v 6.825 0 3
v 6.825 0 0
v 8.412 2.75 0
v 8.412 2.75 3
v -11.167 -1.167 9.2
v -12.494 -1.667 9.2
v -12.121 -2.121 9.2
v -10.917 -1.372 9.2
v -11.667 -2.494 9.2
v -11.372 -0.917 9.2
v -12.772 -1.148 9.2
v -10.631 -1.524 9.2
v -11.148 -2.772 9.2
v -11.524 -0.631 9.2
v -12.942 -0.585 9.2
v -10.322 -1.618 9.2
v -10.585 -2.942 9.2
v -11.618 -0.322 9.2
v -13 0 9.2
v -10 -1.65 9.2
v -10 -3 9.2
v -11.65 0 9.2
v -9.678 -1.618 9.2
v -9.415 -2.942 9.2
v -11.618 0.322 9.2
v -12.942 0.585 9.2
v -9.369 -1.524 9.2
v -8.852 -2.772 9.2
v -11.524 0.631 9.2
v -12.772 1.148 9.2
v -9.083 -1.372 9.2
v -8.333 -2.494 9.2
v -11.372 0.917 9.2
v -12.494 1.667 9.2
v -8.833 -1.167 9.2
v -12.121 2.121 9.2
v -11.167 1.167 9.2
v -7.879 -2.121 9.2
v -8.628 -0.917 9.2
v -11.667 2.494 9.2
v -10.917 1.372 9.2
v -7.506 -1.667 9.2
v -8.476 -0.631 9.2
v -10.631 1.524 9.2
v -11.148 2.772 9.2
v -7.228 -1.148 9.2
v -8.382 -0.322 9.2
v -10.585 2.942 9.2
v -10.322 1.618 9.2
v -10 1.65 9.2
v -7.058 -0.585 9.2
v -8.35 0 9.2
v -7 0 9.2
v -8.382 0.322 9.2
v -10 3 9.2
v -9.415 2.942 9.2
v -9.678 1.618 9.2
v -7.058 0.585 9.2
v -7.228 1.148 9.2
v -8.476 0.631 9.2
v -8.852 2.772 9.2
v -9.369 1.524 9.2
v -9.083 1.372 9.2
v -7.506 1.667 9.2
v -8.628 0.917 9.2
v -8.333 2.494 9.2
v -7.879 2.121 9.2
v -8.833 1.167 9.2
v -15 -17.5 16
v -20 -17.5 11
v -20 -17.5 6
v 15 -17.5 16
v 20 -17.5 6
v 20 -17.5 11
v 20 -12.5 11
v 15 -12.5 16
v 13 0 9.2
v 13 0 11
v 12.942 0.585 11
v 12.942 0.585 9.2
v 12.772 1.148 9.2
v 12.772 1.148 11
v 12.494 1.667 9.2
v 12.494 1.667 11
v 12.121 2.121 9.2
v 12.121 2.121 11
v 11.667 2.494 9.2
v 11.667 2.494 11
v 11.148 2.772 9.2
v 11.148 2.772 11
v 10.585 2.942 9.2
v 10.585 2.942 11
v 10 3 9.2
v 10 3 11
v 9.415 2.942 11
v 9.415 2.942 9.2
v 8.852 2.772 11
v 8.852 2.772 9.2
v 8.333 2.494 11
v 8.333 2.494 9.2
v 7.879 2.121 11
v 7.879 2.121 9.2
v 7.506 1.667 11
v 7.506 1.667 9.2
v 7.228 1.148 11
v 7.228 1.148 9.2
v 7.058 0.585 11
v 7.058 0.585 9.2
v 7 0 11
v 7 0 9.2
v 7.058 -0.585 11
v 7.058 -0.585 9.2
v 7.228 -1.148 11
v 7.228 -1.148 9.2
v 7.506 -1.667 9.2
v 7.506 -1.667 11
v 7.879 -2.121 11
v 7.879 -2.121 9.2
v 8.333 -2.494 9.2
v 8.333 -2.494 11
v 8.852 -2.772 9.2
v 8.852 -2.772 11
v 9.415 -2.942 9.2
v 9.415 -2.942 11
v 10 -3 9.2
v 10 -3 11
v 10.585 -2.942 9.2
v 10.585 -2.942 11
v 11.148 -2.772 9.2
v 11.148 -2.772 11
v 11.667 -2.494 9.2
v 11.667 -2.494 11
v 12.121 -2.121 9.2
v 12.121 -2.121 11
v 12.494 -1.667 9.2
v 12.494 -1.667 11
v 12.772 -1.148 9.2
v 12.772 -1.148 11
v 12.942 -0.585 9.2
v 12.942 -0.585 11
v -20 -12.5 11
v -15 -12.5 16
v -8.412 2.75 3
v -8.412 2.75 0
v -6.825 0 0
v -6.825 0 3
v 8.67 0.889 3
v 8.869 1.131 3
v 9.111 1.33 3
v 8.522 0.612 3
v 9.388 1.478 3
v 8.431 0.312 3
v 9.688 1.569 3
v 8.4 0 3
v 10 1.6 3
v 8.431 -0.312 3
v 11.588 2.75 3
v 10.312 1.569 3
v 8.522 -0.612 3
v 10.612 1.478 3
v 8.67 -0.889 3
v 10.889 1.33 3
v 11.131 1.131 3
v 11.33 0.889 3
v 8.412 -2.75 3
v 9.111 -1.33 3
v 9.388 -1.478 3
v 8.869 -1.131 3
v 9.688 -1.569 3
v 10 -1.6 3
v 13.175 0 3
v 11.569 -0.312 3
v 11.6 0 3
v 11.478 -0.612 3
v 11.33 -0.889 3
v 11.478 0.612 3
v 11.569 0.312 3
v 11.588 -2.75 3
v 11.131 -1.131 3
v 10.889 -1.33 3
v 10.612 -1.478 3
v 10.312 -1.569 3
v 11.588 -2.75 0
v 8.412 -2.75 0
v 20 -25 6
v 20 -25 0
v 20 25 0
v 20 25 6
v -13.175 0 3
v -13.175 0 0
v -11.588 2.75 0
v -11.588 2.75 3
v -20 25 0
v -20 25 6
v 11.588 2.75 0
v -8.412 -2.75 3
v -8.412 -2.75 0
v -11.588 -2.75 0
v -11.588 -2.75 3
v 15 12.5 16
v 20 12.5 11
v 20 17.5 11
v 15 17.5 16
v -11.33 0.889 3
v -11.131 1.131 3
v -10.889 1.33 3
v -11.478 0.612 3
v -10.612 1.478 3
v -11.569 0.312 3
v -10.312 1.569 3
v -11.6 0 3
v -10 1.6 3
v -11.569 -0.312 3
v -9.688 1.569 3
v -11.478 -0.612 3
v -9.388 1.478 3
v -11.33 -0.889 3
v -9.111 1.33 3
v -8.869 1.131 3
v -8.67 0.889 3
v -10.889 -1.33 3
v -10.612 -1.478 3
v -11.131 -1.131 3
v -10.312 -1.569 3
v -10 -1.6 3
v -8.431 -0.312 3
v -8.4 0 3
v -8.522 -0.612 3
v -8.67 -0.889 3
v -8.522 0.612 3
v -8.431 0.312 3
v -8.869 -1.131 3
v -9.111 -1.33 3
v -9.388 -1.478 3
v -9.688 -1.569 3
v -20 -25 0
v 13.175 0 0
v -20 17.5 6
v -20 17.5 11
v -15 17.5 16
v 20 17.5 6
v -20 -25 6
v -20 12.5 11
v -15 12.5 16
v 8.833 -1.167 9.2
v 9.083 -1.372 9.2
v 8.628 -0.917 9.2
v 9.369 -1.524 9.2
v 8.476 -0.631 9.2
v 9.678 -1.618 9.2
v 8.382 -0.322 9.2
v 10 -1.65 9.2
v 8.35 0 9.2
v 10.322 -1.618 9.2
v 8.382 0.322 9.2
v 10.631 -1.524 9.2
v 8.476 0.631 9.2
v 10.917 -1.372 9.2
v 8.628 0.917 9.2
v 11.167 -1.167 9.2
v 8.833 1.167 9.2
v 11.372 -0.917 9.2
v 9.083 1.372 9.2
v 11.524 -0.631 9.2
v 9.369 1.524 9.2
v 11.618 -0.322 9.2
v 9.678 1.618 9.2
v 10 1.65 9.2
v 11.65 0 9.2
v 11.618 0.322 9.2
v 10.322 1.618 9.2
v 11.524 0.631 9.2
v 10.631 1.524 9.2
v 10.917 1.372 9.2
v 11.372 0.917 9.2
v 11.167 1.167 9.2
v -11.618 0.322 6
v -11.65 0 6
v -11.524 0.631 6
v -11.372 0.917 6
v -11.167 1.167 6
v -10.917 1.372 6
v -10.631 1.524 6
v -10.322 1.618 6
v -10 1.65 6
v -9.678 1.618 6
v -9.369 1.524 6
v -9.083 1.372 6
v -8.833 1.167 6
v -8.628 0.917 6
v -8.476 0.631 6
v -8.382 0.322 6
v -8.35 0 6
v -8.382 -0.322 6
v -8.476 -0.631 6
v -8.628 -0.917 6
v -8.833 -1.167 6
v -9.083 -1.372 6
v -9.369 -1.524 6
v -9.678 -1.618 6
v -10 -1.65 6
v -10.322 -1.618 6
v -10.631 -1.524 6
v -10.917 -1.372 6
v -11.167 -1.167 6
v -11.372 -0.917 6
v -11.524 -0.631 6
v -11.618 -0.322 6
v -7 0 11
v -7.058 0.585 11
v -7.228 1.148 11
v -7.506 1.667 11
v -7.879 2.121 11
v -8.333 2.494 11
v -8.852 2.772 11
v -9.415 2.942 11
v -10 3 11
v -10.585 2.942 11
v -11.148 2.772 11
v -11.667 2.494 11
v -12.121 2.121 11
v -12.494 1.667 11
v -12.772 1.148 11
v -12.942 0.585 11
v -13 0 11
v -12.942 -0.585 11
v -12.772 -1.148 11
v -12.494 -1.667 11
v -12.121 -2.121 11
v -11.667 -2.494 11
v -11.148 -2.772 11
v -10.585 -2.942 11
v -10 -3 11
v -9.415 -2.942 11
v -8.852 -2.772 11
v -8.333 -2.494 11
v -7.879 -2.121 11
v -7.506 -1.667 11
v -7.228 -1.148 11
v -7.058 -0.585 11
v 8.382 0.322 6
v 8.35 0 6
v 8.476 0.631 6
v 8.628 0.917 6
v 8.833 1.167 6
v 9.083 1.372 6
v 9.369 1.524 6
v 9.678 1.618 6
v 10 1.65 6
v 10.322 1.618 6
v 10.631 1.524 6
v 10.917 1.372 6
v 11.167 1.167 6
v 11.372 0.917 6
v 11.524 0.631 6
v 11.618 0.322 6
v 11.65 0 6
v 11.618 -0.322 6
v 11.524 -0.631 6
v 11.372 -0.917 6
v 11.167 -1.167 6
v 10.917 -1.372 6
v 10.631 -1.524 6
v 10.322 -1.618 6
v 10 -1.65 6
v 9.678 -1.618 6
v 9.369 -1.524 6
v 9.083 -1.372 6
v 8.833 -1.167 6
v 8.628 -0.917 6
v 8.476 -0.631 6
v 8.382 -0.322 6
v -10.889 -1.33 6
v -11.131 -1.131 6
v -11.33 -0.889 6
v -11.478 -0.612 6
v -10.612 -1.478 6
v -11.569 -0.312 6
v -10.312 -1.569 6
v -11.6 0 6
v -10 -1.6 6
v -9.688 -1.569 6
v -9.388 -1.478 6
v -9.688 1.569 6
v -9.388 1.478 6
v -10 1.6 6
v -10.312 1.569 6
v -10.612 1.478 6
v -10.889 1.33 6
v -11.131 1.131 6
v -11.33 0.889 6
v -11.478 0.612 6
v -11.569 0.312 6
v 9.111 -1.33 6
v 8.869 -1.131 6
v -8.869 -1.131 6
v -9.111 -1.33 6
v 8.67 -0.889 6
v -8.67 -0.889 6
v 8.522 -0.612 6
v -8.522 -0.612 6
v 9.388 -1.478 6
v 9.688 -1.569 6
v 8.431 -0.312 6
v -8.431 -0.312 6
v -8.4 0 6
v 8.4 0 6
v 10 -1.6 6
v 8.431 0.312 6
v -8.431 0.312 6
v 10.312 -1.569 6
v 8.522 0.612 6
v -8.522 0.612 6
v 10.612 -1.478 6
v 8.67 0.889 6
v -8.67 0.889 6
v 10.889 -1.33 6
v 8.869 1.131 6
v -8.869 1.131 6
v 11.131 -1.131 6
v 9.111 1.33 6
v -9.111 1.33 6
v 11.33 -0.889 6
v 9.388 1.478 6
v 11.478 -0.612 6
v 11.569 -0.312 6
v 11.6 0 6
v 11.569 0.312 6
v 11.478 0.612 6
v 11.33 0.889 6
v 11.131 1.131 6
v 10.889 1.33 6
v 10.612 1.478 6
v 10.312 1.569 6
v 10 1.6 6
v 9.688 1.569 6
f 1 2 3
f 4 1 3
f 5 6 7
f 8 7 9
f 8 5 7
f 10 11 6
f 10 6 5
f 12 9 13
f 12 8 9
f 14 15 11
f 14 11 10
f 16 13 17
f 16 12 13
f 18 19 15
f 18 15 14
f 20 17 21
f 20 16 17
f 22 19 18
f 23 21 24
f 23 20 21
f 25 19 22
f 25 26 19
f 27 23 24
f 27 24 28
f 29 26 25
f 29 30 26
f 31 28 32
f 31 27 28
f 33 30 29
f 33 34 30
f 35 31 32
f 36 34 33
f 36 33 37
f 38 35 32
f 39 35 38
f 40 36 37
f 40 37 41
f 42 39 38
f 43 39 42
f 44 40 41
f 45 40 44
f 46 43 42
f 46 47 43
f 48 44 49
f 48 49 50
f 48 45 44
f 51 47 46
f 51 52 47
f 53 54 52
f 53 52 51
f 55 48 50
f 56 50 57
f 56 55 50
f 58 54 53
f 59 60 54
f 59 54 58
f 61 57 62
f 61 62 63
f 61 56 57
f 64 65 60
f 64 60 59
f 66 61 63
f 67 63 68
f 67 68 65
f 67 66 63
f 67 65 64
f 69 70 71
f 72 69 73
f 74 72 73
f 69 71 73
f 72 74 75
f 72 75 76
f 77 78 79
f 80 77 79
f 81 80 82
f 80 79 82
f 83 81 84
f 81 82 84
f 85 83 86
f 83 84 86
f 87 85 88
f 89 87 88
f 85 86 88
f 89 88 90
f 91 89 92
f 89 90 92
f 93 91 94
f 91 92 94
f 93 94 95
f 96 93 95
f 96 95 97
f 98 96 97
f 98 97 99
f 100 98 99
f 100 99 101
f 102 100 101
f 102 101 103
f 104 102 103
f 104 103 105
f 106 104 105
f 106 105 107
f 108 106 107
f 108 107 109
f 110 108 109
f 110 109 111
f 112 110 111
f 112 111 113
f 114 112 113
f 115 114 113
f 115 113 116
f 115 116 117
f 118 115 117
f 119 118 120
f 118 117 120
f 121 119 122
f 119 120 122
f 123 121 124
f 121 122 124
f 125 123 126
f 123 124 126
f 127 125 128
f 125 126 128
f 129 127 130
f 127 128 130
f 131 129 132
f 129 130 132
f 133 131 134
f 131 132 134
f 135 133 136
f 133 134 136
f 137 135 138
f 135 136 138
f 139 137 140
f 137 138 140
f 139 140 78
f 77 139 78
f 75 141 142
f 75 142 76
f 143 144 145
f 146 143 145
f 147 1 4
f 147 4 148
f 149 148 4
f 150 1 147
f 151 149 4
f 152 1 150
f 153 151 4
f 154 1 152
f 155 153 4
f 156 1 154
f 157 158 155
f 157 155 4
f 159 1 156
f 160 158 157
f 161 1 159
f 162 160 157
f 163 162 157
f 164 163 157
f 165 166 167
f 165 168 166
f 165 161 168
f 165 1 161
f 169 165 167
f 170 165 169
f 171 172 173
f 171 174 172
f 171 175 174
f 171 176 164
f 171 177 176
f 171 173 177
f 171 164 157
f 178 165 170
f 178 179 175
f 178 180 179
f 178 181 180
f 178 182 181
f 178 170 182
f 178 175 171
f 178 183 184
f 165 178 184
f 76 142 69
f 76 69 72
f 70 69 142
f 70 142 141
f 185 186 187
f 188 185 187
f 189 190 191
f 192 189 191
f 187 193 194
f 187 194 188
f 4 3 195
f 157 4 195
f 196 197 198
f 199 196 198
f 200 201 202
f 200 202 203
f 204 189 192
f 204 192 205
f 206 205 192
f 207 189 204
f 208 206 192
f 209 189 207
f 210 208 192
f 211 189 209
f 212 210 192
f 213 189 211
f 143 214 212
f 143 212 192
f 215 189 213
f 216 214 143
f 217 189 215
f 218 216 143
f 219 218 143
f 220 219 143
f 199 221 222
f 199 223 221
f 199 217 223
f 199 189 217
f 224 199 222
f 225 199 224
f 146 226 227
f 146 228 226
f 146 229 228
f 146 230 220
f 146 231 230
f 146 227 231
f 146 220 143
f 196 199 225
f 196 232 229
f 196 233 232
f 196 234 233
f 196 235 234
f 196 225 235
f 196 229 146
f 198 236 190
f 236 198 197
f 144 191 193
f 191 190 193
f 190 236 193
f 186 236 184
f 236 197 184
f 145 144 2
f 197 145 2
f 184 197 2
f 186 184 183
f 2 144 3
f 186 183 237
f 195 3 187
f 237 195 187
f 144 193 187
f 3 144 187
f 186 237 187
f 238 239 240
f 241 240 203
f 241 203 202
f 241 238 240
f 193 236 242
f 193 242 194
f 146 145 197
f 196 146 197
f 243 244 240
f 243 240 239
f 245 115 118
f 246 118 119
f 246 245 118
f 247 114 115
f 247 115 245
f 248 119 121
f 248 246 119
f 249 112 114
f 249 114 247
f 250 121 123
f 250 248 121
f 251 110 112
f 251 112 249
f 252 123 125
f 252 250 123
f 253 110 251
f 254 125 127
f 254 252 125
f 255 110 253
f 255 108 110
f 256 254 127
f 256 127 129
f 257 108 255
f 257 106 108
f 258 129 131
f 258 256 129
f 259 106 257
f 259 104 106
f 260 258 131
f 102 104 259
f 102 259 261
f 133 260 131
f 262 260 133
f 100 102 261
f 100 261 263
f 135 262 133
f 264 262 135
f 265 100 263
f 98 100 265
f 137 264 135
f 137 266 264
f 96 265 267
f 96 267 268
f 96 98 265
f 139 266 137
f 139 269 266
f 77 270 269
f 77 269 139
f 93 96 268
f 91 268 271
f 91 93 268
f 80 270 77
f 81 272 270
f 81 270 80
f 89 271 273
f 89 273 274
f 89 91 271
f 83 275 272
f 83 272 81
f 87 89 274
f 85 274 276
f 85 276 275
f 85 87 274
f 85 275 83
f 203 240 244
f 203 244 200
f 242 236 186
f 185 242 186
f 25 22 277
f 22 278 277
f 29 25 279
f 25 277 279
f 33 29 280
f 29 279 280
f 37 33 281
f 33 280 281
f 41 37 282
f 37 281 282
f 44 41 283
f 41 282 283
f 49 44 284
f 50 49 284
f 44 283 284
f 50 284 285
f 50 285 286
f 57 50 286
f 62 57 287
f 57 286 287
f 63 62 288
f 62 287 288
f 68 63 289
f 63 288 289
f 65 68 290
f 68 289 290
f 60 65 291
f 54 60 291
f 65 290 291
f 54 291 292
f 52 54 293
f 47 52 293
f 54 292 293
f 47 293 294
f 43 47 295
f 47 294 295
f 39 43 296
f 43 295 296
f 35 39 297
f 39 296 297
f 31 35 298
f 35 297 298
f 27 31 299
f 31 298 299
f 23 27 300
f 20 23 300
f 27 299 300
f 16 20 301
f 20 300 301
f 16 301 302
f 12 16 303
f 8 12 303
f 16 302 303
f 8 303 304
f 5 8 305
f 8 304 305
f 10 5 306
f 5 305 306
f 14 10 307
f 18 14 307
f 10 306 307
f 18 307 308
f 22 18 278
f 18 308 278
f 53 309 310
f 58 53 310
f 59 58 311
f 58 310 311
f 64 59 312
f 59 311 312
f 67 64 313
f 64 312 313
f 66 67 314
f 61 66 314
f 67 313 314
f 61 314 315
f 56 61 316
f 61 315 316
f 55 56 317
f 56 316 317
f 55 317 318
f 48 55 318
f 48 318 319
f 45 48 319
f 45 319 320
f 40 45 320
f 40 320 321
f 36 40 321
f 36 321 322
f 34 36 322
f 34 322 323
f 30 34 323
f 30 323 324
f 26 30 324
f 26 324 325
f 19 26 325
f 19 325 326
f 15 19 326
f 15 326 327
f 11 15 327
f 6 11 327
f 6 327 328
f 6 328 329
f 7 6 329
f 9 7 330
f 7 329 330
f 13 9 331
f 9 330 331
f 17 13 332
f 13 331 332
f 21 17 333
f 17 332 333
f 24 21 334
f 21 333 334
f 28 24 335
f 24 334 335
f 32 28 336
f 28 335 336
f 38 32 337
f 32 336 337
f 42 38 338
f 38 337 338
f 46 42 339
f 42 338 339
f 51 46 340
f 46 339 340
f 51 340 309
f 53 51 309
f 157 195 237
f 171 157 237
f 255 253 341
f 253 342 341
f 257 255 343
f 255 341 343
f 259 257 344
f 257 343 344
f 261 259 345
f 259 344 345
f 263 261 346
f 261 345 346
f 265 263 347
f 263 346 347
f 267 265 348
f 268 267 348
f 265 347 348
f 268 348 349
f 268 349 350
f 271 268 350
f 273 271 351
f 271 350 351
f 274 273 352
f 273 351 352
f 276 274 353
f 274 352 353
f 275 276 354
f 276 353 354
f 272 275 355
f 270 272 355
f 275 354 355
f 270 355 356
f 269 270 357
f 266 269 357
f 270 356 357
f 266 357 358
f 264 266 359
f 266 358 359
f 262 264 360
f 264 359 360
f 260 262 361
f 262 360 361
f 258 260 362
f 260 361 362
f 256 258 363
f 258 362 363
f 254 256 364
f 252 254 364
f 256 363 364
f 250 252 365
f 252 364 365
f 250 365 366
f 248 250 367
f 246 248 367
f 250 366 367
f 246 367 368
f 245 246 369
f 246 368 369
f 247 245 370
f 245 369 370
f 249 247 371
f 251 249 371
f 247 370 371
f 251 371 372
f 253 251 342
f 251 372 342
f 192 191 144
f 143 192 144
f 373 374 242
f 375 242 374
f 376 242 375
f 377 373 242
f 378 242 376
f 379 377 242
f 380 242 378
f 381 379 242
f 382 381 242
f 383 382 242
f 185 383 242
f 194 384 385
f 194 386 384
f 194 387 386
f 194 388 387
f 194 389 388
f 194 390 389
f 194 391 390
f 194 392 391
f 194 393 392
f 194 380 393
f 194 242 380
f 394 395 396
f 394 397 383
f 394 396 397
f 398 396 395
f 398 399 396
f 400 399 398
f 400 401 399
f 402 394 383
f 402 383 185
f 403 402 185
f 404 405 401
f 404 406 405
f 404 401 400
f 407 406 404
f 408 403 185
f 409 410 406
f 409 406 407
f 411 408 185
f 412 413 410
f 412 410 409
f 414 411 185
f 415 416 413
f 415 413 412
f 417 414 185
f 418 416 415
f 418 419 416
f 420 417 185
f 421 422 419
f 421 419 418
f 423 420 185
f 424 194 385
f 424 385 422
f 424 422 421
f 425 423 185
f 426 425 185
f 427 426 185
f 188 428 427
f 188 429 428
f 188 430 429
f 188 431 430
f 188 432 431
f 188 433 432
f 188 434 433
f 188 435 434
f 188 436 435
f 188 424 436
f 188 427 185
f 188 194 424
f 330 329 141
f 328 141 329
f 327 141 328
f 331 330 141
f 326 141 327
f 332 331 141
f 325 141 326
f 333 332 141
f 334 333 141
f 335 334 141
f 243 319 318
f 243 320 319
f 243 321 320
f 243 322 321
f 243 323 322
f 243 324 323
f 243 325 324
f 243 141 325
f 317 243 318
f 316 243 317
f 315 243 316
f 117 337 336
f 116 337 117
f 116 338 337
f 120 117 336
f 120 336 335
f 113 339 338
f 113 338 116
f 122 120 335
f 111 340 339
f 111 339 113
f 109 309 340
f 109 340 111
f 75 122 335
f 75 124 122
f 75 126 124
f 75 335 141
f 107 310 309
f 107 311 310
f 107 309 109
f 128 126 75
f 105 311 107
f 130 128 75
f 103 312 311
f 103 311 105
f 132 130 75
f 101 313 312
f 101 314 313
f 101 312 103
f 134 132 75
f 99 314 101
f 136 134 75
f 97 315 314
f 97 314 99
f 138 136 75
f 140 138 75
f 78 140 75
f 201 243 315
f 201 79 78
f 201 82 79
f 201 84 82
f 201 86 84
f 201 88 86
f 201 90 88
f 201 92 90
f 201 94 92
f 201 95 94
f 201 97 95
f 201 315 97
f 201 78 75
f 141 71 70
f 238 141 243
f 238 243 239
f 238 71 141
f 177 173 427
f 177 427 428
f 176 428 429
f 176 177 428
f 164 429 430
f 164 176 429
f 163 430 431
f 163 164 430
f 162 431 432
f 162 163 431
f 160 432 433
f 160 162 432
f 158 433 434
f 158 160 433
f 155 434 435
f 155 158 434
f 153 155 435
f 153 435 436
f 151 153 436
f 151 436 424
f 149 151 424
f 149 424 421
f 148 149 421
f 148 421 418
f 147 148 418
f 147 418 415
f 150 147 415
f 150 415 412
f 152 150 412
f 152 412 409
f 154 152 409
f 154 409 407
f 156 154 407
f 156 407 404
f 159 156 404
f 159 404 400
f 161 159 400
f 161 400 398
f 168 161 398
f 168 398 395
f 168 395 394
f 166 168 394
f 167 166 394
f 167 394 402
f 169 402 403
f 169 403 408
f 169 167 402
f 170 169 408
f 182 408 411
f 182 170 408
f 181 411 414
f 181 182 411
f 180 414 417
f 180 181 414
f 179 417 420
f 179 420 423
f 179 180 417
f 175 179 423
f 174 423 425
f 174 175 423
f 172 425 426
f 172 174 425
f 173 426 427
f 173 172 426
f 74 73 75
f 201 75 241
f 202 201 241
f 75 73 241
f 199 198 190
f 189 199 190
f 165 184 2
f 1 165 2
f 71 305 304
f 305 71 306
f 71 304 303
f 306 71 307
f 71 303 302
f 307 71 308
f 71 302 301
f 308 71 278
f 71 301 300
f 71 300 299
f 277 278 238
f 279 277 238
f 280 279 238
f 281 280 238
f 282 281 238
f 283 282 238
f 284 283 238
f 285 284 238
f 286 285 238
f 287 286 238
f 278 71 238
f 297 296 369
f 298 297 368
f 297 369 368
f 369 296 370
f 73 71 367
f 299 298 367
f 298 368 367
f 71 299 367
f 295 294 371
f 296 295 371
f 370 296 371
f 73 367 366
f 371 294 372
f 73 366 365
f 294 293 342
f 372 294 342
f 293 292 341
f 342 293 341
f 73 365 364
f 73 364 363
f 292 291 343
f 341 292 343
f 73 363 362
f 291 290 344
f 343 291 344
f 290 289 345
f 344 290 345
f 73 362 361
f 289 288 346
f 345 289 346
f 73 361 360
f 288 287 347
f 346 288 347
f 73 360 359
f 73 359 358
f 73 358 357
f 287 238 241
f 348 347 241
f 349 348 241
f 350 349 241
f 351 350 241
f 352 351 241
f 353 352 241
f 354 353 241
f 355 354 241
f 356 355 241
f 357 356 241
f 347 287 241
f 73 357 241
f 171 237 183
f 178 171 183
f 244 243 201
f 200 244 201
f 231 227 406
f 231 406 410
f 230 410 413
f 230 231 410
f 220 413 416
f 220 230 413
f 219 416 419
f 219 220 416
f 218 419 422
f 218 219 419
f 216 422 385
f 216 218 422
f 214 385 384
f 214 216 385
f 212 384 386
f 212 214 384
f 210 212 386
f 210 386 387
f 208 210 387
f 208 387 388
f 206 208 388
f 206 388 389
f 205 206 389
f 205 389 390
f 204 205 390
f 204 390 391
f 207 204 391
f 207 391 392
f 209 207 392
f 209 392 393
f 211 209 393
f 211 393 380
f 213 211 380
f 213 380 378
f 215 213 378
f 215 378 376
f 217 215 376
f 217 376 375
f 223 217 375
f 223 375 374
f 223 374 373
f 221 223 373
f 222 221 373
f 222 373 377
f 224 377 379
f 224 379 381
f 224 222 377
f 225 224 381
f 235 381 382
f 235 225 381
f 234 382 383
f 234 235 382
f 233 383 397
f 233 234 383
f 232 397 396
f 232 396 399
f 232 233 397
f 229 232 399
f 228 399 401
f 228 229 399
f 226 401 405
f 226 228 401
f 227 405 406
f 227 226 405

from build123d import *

# Parameters (mm, degrees)
SKETCH_W         = 40
SKETCH_H         = 50
SKETCH_R         = 1.6
PAD_DEPTH        = 6
POCKET_DEPTH     = 3
SKETCH002_W      = 40
SKETCH002_H      = 35
PAD001_DEPTH     = 5
SKETCH003_W      = 40
SKETCH003_H      = 5
PAD002_DEPTH     = 5
HOLE_D           = 3.3
HOLE_DEPTH       = 25
HOLE_CBORE_D     = 6
HOLE_CBORE_DEPTH = 1.8
POCKET001_DEPTH  = 35.001


with BuildPart() as body:
    # Sketch → Pad (new body)
    with BuildSketch(Plane.XY):
        Rectangle(SKETCH_W, SKETCH_H)
        with Locations((-10, 0)):
            Circle(SKETCH_R, mode=Mode.SUBTRACT)
        with Locations((10, 0)):
            Circle(SKETCH_R, mode=Mode.SUBTRACT)
    extrude(amount=PAD_DEPTH)

    # Sketch001 (on Face7 of Pad) → Pocket (cut)
    with BuildSketch(Plane(origin=(0, 0, 0), x_dir=(1, 0, 0), z_dir=(0, 0, -1))):
        Polygon((-8.412287, -2.75), (-6.824574, 0), (-8.412287, 2.75), (-11.587713, 2.75), (-13.175426, 0), (-11.587713, -2.75), align=None)
        Polygon((11.587713, -2.75), (13.175426, 0), (11.587713, 2.75), (8.412287, 2.75), (6.824574, 0), (8.412287, -2.75), align=None)
    extrude(amount=-POCKET_DEPTH, mode=Mode.SUBTRACT)


with BuildPart() as body001:
    # Sketch002 (on Face1 of CopyPocket) → Pad001 (new body)
    with BuildSketch(Plane.XY.offset(6)):
        Rectangle(SKETCH002_W, SKETCH002_H)
    extrude(amount=PAD001_DEPTH)

    # Sketch003 (on Face6 of Pad001) → Pad002 (join)
    with BuildSketch(Plane.XY.offset(11)):
        with Locations((0, 15)):
            Rectangle(SKETCH003_W, SKETCH003_H)
        with Locations((0, -15)):
            Rectangle(SKETCH003_W, SKETCH003_H)
    extrude(amount=PAD002_DEPTH)

    # Hole
    with Locations(Plane.XY.offset(11)):
        with Locations((-10, 0), (10, 0)):
            CounterBoreHole(HOLE_D / 2, HOLE_CBORE_D / 2, HOLE_CBORE_DEPTH, depth=HOLE_DEPTH)

    # Sketch005 (on Face8 of Hole) → Pocket001 (cut, through all)
    with BuildSketch(Plane(origin=(0, -17.5, 6), x_dir=(1, 0, 0), z_dir=(0, -1, 0))):
        Polygon((-20, 14.556483), (20, 14.556483), (20, 5), (15, 10), (-15, 10), (-20, 5), align=None)
    extrude(amount=-POCKET001_DEPTH, mode=Mode.SUBTRACT)


solid = Compound([body.part, body001.part])
